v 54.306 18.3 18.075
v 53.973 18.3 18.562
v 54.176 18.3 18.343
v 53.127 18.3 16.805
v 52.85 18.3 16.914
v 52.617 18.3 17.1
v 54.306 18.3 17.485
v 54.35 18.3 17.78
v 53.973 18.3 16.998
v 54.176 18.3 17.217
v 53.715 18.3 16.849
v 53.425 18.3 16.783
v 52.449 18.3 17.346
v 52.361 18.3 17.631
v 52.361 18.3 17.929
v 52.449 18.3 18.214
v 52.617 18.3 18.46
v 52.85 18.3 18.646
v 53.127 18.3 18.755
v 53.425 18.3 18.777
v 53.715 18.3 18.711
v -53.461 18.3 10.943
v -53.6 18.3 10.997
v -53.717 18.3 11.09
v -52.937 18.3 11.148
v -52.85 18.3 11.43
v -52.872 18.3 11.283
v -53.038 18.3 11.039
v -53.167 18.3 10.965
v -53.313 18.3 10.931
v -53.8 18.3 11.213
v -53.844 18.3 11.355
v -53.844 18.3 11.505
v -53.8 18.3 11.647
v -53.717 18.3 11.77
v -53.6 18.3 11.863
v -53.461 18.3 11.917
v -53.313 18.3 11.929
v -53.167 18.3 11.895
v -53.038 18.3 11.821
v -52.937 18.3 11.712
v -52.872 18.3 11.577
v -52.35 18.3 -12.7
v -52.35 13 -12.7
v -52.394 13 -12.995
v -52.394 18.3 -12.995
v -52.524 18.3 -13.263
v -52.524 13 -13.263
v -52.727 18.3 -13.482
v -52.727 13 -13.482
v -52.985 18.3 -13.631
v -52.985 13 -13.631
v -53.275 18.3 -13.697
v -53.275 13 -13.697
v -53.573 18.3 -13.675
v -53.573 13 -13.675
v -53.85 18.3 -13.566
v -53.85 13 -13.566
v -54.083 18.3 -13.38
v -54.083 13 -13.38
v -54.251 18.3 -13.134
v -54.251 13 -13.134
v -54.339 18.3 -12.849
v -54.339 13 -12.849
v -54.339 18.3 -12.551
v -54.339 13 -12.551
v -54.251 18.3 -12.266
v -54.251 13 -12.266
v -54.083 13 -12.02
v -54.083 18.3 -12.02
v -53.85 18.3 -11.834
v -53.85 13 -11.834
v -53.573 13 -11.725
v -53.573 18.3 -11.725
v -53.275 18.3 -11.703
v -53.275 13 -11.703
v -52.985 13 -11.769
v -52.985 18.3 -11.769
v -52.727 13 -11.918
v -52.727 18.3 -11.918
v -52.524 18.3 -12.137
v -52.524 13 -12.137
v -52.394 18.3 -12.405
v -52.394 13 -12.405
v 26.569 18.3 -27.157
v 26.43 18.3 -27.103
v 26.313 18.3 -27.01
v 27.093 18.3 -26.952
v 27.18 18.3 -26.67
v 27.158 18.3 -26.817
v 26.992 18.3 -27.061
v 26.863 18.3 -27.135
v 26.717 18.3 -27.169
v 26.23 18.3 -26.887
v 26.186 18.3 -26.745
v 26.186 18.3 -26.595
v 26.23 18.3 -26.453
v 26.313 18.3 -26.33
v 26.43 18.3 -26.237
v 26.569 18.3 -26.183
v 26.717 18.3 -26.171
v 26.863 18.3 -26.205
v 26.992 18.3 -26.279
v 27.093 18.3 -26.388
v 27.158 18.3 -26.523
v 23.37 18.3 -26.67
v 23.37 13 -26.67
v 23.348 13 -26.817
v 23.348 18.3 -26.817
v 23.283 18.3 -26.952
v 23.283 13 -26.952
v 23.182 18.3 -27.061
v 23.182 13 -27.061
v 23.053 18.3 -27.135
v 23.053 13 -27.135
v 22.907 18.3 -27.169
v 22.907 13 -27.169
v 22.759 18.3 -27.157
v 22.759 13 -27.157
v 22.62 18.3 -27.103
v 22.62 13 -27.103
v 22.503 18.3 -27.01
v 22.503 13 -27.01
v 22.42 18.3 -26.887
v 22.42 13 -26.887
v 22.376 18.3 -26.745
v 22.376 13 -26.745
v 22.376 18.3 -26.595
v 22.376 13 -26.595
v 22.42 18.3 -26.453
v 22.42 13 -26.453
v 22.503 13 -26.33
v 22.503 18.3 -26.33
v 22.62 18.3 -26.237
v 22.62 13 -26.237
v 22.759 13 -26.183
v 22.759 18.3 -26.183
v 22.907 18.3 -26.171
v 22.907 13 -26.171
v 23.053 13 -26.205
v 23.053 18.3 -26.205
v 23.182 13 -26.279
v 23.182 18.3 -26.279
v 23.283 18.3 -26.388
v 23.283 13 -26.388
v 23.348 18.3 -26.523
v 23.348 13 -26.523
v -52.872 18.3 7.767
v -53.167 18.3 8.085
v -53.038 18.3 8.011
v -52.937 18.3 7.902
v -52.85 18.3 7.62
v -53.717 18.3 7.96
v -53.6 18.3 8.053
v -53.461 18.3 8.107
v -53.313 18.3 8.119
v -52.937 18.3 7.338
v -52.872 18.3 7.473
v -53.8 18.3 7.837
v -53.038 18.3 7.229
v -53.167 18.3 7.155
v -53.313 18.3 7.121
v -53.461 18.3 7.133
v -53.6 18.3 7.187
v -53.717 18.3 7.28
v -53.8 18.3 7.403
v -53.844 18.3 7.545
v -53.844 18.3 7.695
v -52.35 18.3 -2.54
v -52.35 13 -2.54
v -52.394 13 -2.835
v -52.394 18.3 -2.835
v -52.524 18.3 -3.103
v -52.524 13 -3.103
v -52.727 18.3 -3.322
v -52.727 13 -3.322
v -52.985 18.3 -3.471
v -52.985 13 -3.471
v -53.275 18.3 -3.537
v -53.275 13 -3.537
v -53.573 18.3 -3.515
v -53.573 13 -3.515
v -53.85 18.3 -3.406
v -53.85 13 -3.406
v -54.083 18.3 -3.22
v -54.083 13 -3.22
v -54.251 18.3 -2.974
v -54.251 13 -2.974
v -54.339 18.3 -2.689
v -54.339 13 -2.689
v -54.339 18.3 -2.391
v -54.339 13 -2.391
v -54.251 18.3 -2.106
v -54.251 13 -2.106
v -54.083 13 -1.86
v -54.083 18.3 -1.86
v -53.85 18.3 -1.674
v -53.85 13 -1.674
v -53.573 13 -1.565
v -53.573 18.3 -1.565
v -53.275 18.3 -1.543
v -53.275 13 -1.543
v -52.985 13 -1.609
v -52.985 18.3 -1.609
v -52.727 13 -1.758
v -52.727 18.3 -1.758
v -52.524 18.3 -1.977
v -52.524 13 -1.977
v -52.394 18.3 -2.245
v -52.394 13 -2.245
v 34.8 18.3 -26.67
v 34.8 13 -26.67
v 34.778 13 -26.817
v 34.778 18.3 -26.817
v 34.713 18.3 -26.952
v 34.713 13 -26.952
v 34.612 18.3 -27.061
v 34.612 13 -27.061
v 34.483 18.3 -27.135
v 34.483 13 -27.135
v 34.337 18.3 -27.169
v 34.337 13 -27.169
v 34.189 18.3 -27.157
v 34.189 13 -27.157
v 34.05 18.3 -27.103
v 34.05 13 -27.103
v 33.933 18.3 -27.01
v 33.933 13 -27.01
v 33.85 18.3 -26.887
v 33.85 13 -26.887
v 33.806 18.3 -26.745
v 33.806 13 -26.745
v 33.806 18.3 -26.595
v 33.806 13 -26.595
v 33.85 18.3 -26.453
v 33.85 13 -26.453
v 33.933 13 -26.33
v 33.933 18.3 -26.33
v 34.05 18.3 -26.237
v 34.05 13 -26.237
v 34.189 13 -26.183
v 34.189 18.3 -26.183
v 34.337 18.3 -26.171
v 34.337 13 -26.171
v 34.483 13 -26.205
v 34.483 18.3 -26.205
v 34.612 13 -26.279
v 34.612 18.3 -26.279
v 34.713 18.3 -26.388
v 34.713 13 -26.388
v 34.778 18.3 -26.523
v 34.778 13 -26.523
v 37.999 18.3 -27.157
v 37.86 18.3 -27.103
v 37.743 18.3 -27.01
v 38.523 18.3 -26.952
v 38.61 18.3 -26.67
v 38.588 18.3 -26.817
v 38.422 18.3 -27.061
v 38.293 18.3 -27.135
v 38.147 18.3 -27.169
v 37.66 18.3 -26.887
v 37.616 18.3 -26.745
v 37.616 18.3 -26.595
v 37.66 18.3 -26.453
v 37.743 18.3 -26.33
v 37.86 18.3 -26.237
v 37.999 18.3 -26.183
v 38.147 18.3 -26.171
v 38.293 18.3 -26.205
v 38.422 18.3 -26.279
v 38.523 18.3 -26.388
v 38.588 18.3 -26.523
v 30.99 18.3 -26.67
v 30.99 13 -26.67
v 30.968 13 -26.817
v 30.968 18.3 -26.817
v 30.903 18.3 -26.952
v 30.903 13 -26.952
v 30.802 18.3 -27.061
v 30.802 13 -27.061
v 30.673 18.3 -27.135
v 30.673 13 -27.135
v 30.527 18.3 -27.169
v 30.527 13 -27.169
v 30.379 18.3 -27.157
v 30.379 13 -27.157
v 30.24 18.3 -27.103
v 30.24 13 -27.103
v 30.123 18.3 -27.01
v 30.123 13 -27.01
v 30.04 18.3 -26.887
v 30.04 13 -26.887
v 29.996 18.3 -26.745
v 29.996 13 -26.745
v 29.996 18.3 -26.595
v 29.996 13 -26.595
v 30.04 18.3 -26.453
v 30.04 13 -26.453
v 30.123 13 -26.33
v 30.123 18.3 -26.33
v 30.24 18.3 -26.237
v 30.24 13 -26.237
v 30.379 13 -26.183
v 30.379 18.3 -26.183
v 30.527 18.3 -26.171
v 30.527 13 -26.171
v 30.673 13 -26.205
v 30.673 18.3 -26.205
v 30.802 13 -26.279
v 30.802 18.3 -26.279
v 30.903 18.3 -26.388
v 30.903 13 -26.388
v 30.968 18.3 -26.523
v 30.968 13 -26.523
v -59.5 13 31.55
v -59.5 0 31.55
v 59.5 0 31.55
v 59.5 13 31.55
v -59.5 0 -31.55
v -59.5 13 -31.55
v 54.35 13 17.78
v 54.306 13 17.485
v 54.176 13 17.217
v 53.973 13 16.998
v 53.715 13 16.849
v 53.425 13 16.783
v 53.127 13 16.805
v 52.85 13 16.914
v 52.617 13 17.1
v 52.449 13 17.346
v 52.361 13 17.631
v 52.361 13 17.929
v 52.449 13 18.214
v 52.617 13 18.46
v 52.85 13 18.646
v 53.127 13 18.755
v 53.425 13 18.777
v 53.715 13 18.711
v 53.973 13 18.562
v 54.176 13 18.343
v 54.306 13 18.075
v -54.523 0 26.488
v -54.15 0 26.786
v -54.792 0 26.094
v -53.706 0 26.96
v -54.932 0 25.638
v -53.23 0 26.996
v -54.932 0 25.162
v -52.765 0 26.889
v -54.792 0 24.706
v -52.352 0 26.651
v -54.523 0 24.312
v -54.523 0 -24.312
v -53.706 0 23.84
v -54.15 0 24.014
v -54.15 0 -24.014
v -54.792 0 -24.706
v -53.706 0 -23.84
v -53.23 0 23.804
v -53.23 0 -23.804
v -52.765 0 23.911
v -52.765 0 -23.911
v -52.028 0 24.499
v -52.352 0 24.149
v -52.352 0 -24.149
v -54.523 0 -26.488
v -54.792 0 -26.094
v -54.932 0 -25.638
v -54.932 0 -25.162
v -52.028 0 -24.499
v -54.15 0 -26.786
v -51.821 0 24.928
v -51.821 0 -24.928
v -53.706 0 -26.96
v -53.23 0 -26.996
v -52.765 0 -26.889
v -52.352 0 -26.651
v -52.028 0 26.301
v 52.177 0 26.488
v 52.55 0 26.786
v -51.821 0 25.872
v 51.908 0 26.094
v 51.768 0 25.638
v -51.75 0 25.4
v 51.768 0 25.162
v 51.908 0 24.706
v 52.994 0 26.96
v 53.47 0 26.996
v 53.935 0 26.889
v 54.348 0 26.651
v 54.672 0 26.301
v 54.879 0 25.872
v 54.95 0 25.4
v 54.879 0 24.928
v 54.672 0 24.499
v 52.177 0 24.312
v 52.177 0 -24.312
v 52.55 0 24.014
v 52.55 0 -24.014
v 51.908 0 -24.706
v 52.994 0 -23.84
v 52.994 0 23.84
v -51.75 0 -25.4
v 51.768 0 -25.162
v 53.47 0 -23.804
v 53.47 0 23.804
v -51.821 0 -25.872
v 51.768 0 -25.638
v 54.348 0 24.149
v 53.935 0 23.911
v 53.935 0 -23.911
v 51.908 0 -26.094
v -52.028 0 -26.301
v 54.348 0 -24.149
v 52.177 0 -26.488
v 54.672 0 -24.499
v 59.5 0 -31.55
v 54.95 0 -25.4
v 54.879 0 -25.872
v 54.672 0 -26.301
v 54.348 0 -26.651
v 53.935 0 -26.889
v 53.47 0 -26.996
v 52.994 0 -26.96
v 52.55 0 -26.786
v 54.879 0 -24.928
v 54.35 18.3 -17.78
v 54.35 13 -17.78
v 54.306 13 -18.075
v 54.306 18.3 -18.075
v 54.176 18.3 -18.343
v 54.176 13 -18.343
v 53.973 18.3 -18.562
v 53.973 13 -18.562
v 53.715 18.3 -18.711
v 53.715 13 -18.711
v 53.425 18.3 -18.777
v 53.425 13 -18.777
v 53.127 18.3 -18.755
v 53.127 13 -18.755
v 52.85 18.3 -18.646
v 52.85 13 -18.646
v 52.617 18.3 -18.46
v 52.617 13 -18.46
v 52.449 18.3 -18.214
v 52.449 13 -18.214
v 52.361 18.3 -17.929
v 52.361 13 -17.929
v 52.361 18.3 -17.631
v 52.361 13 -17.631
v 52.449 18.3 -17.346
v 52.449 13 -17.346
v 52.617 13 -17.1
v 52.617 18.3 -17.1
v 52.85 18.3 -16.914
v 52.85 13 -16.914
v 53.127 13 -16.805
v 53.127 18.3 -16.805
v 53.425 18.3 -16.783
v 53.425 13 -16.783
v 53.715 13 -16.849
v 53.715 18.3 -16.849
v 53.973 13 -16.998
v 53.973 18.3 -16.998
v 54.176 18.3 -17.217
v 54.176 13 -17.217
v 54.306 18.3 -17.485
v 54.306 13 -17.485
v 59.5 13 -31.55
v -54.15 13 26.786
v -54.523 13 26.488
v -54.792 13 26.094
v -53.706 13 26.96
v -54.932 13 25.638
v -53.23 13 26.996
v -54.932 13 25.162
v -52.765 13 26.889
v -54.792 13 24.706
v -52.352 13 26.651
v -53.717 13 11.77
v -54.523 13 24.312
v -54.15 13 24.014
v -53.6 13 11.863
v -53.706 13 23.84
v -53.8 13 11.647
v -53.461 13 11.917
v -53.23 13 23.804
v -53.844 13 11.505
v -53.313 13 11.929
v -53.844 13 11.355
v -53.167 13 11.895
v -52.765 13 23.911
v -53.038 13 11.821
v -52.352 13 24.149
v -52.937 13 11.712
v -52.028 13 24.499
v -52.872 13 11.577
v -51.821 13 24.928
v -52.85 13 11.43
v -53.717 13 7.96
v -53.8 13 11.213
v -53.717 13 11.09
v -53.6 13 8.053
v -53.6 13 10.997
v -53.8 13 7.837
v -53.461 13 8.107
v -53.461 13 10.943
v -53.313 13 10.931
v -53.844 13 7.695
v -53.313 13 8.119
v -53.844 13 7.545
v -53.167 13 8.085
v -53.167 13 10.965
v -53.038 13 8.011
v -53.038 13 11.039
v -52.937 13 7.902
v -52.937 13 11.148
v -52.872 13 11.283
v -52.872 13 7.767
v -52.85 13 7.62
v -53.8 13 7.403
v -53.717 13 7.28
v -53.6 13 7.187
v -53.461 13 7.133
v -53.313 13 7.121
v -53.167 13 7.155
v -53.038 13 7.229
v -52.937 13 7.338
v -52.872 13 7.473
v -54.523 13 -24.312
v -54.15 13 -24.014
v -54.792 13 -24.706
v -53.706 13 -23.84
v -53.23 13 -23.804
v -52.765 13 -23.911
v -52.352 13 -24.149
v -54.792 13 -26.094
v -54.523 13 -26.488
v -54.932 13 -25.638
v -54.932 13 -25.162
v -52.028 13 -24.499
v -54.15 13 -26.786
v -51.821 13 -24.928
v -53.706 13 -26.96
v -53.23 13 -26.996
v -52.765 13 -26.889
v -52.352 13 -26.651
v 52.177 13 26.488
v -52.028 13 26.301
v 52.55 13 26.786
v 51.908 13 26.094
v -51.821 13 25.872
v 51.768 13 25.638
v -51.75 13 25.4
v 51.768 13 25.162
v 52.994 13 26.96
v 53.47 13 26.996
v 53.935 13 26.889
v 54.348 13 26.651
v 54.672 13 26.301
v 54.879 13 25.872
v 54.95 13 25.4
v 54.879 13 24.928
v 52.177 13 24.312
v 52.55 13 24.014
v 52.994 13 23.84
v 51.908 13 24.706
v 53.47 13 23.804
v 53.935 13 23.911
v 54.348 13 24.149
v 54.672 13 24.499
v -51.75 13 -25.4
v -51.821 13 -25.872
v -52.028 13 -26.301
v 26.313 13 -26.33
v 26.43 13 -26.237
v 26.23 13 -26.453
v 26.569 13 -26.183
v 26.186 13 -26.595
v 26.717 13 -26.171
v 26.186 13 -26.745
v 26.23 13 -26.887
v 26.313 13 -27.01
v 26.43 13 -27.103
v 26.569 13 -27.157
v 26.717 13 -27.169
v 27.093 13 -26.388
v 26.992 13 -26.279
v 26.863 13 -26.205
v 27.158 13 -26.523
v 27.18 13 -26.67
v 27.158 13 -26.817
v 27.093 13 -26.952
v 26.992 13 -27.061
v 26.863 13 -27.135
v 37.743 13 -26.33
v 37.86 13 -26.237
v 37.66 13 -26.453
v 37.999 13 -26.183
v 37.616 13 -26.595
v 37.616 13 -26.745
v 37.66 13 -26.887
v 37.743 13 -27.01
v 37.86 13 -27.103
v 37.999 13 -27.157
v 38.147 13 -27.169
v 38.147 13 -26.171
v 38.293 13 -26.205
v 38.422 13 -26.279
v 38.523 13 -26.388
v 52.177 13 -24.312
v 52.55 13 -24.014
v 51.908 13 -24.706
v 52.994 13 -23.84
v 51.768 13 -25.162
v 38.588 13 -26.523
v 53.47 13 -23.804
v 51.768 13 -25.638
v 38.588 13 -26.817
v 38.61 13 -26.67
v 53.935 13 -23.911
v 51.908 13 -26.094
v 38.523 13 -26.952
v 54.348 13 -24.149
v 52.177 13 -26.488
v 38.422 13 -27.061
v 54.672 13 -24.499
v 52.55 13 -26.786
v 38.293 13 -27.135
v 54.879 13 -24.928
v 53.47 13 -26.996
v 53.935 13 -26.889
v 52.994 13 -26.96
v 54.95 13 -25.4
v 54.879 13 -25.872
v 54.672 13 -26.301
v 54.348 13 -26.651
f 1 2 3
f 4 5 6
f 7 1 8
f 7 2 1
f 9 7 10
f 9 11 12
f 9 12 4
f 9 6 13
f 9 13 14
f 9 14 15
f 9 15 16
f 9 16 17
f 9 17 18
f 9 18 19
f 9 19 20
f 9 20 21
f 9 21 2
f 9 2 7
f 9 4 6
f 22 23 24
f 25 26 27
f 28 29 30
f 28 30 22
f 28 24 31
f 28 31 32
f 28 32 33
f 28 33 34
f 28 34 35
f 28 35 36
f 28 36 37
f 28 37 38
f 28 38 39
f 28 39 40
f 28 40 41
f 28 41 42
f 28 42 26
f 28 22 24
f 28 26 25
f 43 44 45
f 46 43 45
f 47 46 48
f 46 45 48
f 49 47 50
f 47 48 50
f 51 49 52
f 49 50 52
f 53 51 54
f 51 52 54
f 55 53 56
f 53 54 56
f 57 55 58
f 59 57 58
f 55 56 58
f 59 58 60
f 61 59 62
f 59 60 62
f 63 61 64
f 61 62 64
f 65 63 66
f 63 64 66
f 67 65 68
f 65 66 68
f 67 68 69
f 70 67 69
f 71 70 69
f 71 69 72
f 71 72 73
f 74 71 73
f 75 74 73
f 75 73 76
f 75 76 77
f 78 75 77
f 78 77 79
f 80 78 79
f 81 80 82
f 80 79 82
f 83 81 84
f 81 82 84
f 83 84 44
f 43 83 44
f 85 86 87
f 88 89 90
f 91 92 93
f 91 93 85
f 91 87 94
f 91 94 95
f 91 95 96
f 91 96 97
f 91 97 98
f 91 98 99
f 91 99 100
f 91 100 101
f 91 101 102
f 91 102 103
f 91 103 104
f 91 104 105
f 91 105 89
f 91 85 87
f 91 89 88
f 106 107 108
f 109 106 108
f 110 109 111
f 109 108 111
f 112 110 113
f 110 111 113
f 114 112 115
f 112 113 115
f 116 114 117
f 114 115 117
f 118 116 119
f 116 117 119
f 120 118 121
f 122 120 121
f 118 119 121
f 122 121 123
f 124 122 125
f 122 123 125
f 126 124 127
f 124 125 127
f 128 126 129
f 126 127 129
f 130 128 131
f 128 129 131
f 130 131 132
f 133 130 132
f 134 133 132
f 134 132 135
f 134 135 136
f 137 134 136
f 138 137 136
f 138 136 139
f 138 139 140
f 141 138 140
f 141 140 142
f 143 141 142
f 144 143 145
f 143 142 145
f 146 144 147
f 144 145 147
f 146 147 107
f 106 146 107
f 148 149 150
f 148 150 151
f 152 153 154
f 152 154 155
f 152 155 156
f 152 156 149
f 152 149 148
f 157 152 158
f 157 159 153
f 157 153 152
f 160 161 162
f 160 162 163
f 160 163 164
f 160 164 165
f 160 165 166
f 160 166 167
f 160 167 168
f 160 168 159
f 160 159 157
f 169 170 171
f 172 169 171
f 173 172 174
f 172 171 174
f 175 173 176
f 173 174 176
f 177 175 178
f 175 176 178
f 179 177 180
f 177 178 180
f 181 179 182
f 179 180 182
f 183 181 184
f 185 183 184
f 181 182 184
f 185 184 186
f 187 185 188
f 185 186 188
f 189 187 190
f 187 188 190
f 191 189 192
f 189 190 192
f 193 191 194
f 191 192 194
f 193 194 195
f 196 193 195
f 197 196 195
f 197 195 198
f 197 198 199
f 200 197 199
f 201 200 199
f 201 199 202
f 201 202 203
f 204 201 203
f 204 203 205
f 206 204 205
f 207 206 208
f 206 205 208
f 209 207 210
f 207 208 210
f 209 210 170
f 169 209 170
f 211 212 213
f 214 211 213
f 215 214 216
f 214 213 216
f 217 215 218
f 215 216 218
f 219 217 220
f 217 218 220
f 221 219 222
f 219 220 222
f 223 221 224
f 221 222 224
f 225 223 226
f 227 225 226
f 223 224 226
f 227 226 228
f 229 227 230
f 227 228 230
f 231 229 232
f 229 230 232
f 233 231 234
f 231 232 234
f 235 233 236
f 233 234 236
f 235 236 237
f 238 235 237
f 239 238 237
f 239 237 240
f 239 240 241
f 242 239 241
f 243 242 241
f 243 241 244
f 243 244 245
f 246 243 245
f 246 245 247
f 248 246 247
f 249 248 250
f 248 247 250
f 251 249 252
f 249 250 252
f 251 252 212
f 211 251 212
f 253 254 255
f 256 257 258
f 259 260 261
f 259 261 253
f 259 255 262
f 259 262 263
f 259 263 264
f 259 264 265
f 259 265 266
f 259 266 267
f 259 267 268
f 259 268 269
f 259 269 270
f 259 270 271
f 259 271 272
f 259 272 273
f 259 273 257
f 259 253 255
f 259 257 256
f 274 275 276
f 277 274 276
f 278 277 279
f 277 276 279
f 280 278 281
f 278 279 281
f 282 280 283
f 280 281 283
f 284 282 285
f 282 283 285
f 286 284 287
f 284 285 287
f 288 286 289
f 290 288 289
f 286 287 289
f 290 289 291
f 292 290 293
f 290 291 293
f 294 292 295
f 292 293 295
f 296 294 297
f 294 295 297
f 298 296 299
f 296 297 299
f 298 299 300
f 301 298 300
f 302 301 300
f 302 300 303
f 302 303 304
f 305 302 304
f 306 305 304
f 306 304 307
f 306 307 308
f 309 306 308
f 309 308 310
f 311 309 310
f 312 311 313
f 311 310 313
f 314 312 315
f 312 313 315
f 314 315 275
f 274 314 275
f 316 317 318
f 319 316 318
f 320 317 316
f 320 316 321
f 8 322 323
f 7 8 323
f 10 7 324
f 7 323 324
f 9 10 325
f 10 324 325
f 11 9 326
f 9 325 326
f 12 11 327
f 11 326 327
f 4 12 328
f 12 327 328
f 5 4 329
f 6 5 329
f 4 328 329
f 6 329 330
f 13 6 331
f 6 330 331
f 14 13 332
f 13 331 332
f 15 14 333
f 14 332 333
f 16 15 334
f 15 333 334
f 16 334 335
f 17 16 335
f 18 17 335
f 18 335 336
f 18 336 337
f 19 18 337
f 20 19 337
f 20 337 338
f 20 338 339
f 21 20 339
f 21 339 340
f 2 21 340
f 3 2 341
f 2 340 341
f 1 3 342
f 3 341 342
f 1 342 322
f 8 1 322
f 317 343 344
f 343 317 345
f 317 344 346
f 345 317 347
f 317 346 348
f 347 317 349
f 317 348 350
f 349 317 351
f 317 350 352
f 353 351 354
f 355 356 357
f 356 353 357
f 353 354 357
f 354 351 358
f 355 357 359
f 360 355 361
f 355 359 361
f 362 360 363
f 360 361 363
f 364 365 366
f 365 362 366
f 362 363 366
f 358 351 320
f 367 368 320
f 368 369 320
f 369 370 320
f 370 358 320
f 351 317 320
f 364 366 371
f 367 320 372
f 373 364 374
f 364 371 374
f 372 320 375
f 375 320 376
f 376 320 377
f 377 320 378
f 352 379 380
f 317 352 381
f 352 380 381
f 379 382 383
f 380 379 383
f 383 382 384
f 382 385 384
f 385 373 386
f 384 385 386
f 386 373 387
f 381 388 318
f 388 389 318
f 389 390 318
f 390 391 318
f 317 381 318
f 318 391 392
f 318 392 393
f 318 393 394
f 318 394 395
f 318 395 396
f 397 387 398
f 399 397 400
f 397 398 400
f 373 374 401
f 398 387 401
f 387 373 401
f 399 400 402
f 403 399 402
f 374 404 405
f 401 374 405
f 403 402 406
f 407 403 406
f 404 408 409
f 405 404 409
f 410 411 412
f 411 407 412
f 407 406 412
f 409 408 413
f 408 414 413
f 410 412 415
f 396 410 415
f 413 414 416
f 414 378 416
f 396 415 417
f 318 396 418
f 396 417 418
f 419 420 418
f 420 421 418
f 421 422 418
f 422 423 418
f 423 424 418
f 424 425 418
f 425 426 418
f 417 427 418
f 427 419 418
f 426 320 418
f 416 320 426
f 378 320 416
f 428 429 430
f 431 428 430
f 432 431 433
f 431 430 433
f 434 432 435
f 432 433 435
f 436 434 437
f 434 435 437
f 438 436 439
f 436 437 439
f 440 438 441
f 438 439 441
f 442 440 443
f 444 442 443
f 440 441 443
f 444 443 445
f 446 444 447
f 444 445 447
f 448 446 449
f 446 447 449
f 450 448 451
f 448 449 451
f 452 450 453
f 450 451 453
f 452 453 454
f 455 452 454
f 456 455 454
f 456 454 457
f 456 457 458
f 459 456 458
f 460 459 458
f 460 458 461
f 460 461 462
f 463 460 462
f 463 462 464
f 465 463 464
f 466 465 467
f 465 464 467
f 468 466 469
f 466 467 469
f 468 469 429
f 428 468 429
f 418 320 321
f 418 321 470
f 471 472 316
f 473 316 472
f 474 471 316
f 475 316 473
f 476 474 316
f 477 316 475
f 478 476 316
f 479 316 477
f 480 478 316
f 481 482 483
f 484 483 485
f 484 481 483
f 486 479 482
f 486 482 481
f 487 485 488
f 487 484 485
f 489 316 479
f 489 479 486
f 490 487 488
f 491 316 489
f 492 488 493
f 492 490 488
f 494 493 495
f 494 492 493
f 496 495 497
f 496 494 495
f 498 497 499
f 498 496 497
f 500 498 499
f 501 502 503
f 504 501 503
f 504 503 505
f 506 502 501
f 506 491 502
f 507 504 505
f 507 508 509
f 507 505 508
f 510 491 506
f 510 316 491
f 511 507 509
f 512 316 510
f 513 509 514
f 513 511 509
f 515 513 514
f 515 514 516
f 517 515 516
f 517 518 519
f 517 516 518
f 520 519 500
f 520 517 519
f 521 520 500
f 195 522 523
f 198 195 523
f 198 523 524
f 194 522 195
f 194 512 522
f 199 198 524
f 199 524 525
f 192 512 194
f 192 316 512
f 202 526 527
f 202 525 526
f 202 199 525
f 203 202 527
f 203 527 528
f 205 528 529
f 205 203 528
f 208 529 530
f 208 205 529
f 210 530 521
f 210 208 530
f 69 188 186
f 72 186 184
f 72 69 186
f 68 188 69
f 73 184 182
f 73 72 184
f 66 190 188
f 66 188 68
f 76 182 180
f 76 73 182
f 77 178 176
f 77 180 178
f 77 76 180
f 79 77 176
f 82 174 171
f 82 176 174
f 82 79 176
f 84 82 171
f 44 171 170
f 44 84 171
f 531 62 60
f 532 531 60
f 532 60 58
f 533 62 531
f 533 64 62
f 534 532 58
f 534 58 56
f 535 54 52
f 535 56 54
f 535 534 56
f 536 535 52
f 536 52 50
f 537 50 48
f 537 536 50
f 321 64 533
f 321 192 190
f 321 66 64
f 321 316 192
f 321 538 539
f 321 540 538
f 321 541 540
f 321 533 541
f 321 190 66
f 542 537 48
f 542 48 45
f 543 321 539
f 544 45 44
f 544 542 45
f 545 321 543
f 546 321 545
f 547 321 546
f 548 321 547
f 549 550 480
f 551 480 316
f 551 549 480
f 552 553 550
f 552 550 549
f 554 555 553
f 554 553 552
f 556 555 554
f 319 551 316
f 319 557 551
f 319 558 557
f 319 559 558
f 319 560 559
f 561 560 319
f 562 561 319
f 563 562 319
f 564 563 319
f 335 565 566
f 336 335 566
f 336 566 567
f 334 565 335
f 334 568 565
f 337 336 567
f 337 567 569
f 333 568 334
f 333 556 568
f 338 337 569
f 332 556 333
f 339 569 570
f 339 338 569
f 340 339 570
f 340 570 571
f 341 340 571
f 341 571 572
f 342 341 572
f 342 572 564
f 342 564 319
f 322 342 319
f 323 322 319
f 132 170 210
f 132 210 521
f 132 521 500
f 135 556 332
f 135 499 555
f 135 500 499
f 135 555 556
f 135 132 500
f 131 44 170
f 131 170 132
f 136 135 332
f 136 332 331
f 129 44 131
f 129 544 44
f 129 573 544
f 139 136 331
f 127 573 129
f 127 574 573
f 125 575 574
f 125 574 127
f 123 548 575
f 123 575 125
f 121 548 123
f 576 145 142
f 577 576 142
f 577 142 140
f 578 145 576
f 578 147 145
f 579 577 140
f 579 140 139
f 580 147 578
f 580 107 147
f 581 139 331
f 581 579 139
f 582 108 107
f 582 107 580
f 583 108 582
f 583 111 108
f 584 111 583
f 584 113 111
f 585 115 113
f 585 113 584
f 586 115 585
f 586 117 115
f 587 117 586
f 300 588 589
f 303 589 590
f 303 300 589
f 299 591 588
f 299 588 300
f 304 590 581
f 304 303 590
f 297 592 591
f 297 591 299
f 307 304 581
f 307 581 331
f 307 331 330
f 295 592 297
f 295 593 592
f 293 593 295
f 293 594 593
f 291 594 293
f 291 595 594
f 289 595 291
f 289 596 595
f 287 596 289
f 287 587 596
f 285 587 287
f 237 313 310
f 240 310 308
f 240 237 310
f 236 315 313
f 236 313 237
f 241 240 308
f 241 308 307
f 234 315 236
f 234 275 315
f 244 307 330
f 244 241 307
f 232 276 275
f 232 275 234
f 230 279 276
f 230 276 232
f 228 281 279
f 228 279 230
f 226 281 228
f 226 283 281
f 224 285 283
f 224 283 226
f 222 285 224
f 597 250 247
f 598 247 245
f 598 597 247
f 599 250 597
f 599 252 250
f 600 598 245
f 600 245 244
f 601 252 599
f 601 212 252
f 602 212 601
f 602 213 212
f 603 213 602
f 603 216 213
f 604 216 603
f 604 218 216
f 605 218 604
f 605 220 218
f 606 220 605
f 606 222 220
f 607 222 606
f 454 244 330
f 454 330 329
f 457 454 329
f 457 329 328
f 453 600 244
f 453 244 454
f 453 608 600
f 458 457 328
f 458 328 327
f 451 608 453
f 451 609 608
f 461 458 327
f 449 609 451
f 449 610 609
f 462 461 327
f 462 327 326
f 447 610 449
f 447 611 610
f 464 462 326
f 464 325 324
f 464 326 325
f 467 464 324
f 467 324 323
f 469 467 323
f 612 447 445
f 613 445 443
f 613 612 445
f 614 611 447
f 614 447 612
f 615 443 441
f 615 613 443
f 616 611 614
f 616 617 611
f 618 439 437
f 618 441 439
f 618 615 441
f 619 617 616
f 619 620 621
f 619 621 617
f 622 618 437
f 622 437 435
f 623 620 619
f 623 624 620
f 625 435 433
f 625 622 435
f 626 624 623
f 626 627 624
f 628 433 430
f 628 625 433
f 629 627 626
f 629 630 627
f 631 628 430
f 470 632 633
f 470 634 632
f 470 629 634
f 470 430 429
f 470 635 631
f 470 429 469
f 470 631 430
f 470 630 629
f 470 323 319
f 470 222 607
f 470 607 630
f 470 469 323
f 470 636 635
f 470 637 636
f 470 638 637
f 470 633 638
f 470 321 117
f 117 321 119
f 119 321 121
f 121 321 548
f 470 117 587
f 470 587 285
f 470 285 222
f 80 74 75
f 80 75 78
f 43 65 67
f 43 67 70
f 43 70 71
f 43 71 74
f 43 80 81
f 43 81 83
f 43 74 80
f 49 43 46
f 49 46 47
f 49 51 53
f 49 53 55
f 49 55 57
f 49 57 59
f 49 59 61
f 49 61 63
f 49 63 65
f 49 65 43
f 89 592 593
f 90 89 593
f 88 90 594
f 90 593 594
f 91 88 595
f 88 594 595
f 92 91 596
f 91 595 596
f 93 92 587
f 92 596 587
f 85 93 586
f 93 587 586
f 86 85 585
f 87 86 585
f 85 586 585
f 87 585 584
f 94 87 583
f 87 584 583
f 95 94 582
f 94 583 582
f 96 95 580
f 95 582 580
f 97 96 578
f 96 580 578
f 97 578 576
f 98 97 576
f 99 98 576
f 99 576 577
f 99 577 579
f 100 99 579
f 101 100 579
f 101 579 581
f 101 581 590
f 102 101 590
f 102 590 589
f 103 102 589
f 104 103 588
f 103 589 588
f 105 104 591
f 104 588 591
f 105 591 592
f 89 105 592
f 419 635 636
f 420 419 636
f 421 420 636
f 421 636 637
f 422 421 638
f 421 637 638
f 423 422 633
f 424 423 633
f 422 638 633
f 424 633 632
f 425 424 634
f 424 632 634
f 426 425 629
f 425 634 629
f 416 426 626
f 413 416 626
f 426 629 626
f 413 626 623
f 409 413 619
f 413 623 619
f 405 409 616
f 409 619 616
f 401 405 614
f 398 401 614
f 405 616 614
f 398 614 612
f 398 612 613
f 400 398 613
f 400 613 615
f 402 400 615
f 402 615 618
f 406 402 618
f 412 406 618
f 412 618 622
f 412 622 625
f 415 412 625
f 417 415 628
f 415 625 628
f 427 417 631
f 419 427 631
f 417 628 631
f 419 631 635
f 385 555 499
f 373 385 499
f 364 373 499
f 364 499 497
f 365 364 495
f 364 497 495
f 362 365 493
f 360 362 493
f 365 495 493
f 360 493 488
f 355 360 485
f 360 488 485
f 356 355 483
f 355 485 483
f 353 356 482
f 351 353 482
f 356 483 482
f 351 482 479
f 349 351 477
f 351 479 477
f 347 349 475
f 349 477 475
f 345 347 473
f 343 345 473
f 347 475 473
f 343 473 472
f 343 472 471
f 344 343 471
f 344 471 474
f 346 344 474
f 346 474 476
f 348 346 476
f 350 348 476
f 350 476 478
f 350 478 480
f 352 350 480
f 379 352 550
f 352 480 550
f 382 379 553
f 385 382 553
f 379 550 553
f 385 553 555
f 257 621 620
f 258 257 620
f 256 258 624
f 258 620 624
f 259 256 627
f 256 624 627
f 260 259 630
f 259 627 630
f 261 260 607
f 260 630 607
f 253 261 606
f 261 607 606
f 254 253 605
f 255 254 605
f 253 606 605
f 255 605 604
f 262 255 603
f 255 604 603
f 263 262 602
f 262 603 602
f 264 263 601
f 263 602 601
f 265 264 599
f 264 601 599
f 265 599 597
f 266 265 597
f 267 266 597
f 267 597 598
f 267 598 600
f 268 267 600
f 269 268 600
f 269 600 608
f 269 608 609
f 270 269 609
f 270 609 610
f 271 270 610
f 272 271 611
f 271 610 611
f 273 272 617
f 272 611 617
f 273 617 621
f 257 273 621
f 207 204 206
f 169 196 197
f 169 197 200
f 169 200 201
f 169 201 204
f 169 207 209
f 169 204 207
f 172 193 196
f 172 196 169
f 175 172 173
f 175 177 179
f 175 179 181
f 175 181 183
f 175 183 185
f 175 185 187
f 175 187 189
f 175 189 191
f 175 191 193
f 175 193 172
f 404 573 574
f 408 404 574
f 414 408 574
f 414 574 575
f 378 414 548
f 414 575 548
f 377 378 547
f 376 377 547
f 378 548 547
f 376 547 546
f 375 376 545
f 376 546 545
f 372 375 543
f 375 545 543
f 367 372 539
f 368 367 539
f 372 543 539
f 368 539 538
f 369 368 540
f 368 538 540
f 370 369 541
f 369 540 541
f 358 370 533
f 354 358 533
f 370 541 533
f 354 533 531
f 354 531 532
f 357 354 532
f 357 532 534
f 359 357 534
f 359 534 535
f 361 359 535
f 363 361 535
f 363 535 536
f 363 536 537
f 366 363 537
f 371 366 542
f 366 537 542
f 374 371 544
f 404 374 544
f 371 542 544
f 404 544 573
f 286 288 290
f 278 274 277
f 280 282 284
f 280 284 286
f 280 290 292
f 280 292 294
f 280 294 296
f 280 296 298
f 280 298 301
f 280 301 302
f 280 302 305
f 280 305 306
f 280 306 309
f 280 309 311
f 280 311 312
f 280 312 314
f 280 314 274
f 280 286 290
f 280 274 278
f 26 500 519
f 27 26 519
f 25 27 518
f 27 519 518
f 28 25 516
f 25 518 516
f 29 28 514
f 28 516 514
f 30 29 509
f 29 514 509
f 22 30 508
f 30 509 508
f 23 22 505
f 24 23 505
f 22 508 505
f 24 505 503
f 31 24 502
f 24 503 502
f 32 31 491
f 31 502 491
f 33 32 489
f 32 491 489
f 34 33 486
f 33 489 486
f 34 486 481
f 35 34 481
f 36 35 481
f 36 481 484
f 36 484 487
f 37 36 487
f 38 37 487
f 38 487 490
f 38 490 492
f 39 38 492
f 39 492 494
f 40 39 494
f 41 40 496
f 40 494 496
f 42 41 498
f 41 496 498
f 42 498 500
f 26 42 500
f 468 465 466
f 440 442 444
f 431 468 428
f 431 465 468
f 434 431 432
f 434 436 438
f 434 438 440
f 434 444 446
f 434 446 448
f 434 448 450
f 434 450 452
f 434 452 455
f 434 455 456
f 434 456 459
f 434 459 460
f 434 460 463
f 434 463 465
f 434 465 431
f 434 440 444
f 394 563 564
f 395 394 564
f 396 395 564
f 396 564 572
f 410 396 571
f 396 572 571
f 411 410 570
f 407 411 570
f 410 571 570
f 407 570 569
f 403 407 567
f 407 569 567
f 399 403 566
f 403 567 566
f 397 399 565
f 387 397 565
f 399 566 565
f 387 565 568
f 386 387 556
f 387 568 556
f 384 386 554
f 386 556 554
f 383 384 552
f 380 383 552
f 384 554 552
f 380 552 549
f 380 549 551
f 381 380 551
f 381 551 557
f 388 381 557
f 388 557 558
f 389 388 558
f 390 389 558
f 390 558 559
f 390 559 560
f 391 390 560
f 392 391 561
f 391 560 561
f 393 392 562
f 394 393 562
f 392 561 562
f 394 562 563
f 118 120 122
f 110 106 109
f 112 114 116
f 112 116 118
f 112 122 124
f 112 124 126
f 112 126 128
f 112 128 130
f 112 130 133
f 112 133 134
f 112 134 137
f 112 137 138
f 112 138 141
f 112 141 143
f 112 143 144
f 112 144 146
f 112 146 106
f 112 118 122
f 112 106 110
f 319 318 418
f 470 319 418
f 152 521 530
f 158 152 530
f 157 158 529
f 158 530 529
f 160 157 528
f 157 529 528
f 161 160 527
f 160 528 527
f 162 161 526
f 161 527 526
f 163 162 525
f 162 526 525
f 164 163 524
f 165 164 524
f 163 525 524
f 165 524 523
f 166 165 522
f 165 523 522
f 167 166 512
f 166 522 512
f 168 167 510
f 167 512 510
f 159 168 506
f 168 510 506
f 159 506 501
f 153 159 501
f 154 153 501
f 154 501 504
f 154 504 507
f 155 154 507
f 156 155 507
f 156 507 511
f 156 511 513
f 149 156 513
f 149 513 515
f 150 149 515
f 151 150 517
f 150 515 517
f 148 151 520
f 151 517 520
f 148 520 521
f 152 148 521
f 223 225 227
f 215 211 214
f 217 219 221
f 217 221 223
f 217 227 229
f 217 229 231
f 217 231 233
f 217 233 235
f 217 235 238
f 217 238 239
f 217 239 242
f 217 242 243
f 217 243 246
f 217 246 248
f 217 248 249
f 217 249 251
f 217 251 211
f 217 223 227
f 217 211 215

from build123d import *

# Parameters (mm, degrees)
SKETCH_1_W          = 119
SKETCH_1_H          = 63.1
EXTRUDE_1_DEPTH     = 13
SKETCH_2_R          = 1.6
CUT_EXTRUDE_2_DEPTH = 13
SKETCH_3_R          = 1
EXTRUDE_2_DEPTH     = 5.3
SKETCH_4_R          = 0.5
EXTRUDE_3_DEPTH     = 5.3


with BuildPart() as part:
    # 草图1 → 凸台-拉伸1 (new body)
    with BuildSketch(Plane(origin=(0, 0, 0), x_dir=(1, 0, 0), z_dir=(0, 1, 0))):
        Rectangle(SKETCH_1_W, SKETCH_1_H)
    extrude(amount=EXTRUDE_1_DEPTH)

    # 草图2 → 切除-拉伸2 (cut)
    with BuildSketch(Plane(origin=(0, 13, 0), x_dir=(1, 0, 0), z_dir=(0, 1, 0))):
        with Locations((53.35, 25.4)):
            Circle(SKETCH_2_R)
        with Locations((53.35, -25.4)):
            Circle(SKETCH_2_R)
        with Locations((-53.35, 25.4)):
            Circle(SKETCH_2_R)
        with Locations((-53.35, -25.4)):
            Circle(SKETCH_2_R)
    extrude(amount=-CUT_EXTRUDE_2_DEPTH, mode=Mode.SUBTRACT)

    # 草图3 → 凸台-拉伸2 (add)
    with BuildSketch(Plane(origin=(0, 13, 0), x_dir=(1, 0, 0), z_dir=(0, 1, 0))):
        with Locations((53.35, 17.78)):
            Circle(SKETCH_3_R)
        with Locations((53.35, -17.78)):
            Circle(SKETCH_3_R)
        with Locations((-53.35, 12.7)):
            Circle(SKETCH_3_R)
        with Locations((-53.35, 2.54)):
            Circle(SKETCH_3_R)
    extrude(amount=EXTRUDE_2_DEPTH)

    # 草图4 → 凸台-拉伸3 (add)
    with BuildSketch(Plane(origin=(0, 13, 0), x_dir=(1, 0, 0), z_dir=(0, 1, 0))):
        with Locations((-53.35, -7.62)):
            Circle(SKETCH_4_R)
        with Locations((-53.35, -11.43)):
            Circle(SKETCH_4_R)
        with Locations((34.3, 26.67)):
            Circle(SKETCH_4_R)
        with Locations((38.11, 26.67)):
            Circle(SKETCH_4_R)
        with Locations((30.49, 26.67)):
            Circle(SKETCH_4_R)
        with Locations((26.68, 26.67)):
            Circle(SKETCH_4_R)
        with Locations((22.87, 26.67)):
            Circle(SKETCH_4_R)
    extrude(amount=EXTRUDE_3_DEPTH)


solid = part.part
